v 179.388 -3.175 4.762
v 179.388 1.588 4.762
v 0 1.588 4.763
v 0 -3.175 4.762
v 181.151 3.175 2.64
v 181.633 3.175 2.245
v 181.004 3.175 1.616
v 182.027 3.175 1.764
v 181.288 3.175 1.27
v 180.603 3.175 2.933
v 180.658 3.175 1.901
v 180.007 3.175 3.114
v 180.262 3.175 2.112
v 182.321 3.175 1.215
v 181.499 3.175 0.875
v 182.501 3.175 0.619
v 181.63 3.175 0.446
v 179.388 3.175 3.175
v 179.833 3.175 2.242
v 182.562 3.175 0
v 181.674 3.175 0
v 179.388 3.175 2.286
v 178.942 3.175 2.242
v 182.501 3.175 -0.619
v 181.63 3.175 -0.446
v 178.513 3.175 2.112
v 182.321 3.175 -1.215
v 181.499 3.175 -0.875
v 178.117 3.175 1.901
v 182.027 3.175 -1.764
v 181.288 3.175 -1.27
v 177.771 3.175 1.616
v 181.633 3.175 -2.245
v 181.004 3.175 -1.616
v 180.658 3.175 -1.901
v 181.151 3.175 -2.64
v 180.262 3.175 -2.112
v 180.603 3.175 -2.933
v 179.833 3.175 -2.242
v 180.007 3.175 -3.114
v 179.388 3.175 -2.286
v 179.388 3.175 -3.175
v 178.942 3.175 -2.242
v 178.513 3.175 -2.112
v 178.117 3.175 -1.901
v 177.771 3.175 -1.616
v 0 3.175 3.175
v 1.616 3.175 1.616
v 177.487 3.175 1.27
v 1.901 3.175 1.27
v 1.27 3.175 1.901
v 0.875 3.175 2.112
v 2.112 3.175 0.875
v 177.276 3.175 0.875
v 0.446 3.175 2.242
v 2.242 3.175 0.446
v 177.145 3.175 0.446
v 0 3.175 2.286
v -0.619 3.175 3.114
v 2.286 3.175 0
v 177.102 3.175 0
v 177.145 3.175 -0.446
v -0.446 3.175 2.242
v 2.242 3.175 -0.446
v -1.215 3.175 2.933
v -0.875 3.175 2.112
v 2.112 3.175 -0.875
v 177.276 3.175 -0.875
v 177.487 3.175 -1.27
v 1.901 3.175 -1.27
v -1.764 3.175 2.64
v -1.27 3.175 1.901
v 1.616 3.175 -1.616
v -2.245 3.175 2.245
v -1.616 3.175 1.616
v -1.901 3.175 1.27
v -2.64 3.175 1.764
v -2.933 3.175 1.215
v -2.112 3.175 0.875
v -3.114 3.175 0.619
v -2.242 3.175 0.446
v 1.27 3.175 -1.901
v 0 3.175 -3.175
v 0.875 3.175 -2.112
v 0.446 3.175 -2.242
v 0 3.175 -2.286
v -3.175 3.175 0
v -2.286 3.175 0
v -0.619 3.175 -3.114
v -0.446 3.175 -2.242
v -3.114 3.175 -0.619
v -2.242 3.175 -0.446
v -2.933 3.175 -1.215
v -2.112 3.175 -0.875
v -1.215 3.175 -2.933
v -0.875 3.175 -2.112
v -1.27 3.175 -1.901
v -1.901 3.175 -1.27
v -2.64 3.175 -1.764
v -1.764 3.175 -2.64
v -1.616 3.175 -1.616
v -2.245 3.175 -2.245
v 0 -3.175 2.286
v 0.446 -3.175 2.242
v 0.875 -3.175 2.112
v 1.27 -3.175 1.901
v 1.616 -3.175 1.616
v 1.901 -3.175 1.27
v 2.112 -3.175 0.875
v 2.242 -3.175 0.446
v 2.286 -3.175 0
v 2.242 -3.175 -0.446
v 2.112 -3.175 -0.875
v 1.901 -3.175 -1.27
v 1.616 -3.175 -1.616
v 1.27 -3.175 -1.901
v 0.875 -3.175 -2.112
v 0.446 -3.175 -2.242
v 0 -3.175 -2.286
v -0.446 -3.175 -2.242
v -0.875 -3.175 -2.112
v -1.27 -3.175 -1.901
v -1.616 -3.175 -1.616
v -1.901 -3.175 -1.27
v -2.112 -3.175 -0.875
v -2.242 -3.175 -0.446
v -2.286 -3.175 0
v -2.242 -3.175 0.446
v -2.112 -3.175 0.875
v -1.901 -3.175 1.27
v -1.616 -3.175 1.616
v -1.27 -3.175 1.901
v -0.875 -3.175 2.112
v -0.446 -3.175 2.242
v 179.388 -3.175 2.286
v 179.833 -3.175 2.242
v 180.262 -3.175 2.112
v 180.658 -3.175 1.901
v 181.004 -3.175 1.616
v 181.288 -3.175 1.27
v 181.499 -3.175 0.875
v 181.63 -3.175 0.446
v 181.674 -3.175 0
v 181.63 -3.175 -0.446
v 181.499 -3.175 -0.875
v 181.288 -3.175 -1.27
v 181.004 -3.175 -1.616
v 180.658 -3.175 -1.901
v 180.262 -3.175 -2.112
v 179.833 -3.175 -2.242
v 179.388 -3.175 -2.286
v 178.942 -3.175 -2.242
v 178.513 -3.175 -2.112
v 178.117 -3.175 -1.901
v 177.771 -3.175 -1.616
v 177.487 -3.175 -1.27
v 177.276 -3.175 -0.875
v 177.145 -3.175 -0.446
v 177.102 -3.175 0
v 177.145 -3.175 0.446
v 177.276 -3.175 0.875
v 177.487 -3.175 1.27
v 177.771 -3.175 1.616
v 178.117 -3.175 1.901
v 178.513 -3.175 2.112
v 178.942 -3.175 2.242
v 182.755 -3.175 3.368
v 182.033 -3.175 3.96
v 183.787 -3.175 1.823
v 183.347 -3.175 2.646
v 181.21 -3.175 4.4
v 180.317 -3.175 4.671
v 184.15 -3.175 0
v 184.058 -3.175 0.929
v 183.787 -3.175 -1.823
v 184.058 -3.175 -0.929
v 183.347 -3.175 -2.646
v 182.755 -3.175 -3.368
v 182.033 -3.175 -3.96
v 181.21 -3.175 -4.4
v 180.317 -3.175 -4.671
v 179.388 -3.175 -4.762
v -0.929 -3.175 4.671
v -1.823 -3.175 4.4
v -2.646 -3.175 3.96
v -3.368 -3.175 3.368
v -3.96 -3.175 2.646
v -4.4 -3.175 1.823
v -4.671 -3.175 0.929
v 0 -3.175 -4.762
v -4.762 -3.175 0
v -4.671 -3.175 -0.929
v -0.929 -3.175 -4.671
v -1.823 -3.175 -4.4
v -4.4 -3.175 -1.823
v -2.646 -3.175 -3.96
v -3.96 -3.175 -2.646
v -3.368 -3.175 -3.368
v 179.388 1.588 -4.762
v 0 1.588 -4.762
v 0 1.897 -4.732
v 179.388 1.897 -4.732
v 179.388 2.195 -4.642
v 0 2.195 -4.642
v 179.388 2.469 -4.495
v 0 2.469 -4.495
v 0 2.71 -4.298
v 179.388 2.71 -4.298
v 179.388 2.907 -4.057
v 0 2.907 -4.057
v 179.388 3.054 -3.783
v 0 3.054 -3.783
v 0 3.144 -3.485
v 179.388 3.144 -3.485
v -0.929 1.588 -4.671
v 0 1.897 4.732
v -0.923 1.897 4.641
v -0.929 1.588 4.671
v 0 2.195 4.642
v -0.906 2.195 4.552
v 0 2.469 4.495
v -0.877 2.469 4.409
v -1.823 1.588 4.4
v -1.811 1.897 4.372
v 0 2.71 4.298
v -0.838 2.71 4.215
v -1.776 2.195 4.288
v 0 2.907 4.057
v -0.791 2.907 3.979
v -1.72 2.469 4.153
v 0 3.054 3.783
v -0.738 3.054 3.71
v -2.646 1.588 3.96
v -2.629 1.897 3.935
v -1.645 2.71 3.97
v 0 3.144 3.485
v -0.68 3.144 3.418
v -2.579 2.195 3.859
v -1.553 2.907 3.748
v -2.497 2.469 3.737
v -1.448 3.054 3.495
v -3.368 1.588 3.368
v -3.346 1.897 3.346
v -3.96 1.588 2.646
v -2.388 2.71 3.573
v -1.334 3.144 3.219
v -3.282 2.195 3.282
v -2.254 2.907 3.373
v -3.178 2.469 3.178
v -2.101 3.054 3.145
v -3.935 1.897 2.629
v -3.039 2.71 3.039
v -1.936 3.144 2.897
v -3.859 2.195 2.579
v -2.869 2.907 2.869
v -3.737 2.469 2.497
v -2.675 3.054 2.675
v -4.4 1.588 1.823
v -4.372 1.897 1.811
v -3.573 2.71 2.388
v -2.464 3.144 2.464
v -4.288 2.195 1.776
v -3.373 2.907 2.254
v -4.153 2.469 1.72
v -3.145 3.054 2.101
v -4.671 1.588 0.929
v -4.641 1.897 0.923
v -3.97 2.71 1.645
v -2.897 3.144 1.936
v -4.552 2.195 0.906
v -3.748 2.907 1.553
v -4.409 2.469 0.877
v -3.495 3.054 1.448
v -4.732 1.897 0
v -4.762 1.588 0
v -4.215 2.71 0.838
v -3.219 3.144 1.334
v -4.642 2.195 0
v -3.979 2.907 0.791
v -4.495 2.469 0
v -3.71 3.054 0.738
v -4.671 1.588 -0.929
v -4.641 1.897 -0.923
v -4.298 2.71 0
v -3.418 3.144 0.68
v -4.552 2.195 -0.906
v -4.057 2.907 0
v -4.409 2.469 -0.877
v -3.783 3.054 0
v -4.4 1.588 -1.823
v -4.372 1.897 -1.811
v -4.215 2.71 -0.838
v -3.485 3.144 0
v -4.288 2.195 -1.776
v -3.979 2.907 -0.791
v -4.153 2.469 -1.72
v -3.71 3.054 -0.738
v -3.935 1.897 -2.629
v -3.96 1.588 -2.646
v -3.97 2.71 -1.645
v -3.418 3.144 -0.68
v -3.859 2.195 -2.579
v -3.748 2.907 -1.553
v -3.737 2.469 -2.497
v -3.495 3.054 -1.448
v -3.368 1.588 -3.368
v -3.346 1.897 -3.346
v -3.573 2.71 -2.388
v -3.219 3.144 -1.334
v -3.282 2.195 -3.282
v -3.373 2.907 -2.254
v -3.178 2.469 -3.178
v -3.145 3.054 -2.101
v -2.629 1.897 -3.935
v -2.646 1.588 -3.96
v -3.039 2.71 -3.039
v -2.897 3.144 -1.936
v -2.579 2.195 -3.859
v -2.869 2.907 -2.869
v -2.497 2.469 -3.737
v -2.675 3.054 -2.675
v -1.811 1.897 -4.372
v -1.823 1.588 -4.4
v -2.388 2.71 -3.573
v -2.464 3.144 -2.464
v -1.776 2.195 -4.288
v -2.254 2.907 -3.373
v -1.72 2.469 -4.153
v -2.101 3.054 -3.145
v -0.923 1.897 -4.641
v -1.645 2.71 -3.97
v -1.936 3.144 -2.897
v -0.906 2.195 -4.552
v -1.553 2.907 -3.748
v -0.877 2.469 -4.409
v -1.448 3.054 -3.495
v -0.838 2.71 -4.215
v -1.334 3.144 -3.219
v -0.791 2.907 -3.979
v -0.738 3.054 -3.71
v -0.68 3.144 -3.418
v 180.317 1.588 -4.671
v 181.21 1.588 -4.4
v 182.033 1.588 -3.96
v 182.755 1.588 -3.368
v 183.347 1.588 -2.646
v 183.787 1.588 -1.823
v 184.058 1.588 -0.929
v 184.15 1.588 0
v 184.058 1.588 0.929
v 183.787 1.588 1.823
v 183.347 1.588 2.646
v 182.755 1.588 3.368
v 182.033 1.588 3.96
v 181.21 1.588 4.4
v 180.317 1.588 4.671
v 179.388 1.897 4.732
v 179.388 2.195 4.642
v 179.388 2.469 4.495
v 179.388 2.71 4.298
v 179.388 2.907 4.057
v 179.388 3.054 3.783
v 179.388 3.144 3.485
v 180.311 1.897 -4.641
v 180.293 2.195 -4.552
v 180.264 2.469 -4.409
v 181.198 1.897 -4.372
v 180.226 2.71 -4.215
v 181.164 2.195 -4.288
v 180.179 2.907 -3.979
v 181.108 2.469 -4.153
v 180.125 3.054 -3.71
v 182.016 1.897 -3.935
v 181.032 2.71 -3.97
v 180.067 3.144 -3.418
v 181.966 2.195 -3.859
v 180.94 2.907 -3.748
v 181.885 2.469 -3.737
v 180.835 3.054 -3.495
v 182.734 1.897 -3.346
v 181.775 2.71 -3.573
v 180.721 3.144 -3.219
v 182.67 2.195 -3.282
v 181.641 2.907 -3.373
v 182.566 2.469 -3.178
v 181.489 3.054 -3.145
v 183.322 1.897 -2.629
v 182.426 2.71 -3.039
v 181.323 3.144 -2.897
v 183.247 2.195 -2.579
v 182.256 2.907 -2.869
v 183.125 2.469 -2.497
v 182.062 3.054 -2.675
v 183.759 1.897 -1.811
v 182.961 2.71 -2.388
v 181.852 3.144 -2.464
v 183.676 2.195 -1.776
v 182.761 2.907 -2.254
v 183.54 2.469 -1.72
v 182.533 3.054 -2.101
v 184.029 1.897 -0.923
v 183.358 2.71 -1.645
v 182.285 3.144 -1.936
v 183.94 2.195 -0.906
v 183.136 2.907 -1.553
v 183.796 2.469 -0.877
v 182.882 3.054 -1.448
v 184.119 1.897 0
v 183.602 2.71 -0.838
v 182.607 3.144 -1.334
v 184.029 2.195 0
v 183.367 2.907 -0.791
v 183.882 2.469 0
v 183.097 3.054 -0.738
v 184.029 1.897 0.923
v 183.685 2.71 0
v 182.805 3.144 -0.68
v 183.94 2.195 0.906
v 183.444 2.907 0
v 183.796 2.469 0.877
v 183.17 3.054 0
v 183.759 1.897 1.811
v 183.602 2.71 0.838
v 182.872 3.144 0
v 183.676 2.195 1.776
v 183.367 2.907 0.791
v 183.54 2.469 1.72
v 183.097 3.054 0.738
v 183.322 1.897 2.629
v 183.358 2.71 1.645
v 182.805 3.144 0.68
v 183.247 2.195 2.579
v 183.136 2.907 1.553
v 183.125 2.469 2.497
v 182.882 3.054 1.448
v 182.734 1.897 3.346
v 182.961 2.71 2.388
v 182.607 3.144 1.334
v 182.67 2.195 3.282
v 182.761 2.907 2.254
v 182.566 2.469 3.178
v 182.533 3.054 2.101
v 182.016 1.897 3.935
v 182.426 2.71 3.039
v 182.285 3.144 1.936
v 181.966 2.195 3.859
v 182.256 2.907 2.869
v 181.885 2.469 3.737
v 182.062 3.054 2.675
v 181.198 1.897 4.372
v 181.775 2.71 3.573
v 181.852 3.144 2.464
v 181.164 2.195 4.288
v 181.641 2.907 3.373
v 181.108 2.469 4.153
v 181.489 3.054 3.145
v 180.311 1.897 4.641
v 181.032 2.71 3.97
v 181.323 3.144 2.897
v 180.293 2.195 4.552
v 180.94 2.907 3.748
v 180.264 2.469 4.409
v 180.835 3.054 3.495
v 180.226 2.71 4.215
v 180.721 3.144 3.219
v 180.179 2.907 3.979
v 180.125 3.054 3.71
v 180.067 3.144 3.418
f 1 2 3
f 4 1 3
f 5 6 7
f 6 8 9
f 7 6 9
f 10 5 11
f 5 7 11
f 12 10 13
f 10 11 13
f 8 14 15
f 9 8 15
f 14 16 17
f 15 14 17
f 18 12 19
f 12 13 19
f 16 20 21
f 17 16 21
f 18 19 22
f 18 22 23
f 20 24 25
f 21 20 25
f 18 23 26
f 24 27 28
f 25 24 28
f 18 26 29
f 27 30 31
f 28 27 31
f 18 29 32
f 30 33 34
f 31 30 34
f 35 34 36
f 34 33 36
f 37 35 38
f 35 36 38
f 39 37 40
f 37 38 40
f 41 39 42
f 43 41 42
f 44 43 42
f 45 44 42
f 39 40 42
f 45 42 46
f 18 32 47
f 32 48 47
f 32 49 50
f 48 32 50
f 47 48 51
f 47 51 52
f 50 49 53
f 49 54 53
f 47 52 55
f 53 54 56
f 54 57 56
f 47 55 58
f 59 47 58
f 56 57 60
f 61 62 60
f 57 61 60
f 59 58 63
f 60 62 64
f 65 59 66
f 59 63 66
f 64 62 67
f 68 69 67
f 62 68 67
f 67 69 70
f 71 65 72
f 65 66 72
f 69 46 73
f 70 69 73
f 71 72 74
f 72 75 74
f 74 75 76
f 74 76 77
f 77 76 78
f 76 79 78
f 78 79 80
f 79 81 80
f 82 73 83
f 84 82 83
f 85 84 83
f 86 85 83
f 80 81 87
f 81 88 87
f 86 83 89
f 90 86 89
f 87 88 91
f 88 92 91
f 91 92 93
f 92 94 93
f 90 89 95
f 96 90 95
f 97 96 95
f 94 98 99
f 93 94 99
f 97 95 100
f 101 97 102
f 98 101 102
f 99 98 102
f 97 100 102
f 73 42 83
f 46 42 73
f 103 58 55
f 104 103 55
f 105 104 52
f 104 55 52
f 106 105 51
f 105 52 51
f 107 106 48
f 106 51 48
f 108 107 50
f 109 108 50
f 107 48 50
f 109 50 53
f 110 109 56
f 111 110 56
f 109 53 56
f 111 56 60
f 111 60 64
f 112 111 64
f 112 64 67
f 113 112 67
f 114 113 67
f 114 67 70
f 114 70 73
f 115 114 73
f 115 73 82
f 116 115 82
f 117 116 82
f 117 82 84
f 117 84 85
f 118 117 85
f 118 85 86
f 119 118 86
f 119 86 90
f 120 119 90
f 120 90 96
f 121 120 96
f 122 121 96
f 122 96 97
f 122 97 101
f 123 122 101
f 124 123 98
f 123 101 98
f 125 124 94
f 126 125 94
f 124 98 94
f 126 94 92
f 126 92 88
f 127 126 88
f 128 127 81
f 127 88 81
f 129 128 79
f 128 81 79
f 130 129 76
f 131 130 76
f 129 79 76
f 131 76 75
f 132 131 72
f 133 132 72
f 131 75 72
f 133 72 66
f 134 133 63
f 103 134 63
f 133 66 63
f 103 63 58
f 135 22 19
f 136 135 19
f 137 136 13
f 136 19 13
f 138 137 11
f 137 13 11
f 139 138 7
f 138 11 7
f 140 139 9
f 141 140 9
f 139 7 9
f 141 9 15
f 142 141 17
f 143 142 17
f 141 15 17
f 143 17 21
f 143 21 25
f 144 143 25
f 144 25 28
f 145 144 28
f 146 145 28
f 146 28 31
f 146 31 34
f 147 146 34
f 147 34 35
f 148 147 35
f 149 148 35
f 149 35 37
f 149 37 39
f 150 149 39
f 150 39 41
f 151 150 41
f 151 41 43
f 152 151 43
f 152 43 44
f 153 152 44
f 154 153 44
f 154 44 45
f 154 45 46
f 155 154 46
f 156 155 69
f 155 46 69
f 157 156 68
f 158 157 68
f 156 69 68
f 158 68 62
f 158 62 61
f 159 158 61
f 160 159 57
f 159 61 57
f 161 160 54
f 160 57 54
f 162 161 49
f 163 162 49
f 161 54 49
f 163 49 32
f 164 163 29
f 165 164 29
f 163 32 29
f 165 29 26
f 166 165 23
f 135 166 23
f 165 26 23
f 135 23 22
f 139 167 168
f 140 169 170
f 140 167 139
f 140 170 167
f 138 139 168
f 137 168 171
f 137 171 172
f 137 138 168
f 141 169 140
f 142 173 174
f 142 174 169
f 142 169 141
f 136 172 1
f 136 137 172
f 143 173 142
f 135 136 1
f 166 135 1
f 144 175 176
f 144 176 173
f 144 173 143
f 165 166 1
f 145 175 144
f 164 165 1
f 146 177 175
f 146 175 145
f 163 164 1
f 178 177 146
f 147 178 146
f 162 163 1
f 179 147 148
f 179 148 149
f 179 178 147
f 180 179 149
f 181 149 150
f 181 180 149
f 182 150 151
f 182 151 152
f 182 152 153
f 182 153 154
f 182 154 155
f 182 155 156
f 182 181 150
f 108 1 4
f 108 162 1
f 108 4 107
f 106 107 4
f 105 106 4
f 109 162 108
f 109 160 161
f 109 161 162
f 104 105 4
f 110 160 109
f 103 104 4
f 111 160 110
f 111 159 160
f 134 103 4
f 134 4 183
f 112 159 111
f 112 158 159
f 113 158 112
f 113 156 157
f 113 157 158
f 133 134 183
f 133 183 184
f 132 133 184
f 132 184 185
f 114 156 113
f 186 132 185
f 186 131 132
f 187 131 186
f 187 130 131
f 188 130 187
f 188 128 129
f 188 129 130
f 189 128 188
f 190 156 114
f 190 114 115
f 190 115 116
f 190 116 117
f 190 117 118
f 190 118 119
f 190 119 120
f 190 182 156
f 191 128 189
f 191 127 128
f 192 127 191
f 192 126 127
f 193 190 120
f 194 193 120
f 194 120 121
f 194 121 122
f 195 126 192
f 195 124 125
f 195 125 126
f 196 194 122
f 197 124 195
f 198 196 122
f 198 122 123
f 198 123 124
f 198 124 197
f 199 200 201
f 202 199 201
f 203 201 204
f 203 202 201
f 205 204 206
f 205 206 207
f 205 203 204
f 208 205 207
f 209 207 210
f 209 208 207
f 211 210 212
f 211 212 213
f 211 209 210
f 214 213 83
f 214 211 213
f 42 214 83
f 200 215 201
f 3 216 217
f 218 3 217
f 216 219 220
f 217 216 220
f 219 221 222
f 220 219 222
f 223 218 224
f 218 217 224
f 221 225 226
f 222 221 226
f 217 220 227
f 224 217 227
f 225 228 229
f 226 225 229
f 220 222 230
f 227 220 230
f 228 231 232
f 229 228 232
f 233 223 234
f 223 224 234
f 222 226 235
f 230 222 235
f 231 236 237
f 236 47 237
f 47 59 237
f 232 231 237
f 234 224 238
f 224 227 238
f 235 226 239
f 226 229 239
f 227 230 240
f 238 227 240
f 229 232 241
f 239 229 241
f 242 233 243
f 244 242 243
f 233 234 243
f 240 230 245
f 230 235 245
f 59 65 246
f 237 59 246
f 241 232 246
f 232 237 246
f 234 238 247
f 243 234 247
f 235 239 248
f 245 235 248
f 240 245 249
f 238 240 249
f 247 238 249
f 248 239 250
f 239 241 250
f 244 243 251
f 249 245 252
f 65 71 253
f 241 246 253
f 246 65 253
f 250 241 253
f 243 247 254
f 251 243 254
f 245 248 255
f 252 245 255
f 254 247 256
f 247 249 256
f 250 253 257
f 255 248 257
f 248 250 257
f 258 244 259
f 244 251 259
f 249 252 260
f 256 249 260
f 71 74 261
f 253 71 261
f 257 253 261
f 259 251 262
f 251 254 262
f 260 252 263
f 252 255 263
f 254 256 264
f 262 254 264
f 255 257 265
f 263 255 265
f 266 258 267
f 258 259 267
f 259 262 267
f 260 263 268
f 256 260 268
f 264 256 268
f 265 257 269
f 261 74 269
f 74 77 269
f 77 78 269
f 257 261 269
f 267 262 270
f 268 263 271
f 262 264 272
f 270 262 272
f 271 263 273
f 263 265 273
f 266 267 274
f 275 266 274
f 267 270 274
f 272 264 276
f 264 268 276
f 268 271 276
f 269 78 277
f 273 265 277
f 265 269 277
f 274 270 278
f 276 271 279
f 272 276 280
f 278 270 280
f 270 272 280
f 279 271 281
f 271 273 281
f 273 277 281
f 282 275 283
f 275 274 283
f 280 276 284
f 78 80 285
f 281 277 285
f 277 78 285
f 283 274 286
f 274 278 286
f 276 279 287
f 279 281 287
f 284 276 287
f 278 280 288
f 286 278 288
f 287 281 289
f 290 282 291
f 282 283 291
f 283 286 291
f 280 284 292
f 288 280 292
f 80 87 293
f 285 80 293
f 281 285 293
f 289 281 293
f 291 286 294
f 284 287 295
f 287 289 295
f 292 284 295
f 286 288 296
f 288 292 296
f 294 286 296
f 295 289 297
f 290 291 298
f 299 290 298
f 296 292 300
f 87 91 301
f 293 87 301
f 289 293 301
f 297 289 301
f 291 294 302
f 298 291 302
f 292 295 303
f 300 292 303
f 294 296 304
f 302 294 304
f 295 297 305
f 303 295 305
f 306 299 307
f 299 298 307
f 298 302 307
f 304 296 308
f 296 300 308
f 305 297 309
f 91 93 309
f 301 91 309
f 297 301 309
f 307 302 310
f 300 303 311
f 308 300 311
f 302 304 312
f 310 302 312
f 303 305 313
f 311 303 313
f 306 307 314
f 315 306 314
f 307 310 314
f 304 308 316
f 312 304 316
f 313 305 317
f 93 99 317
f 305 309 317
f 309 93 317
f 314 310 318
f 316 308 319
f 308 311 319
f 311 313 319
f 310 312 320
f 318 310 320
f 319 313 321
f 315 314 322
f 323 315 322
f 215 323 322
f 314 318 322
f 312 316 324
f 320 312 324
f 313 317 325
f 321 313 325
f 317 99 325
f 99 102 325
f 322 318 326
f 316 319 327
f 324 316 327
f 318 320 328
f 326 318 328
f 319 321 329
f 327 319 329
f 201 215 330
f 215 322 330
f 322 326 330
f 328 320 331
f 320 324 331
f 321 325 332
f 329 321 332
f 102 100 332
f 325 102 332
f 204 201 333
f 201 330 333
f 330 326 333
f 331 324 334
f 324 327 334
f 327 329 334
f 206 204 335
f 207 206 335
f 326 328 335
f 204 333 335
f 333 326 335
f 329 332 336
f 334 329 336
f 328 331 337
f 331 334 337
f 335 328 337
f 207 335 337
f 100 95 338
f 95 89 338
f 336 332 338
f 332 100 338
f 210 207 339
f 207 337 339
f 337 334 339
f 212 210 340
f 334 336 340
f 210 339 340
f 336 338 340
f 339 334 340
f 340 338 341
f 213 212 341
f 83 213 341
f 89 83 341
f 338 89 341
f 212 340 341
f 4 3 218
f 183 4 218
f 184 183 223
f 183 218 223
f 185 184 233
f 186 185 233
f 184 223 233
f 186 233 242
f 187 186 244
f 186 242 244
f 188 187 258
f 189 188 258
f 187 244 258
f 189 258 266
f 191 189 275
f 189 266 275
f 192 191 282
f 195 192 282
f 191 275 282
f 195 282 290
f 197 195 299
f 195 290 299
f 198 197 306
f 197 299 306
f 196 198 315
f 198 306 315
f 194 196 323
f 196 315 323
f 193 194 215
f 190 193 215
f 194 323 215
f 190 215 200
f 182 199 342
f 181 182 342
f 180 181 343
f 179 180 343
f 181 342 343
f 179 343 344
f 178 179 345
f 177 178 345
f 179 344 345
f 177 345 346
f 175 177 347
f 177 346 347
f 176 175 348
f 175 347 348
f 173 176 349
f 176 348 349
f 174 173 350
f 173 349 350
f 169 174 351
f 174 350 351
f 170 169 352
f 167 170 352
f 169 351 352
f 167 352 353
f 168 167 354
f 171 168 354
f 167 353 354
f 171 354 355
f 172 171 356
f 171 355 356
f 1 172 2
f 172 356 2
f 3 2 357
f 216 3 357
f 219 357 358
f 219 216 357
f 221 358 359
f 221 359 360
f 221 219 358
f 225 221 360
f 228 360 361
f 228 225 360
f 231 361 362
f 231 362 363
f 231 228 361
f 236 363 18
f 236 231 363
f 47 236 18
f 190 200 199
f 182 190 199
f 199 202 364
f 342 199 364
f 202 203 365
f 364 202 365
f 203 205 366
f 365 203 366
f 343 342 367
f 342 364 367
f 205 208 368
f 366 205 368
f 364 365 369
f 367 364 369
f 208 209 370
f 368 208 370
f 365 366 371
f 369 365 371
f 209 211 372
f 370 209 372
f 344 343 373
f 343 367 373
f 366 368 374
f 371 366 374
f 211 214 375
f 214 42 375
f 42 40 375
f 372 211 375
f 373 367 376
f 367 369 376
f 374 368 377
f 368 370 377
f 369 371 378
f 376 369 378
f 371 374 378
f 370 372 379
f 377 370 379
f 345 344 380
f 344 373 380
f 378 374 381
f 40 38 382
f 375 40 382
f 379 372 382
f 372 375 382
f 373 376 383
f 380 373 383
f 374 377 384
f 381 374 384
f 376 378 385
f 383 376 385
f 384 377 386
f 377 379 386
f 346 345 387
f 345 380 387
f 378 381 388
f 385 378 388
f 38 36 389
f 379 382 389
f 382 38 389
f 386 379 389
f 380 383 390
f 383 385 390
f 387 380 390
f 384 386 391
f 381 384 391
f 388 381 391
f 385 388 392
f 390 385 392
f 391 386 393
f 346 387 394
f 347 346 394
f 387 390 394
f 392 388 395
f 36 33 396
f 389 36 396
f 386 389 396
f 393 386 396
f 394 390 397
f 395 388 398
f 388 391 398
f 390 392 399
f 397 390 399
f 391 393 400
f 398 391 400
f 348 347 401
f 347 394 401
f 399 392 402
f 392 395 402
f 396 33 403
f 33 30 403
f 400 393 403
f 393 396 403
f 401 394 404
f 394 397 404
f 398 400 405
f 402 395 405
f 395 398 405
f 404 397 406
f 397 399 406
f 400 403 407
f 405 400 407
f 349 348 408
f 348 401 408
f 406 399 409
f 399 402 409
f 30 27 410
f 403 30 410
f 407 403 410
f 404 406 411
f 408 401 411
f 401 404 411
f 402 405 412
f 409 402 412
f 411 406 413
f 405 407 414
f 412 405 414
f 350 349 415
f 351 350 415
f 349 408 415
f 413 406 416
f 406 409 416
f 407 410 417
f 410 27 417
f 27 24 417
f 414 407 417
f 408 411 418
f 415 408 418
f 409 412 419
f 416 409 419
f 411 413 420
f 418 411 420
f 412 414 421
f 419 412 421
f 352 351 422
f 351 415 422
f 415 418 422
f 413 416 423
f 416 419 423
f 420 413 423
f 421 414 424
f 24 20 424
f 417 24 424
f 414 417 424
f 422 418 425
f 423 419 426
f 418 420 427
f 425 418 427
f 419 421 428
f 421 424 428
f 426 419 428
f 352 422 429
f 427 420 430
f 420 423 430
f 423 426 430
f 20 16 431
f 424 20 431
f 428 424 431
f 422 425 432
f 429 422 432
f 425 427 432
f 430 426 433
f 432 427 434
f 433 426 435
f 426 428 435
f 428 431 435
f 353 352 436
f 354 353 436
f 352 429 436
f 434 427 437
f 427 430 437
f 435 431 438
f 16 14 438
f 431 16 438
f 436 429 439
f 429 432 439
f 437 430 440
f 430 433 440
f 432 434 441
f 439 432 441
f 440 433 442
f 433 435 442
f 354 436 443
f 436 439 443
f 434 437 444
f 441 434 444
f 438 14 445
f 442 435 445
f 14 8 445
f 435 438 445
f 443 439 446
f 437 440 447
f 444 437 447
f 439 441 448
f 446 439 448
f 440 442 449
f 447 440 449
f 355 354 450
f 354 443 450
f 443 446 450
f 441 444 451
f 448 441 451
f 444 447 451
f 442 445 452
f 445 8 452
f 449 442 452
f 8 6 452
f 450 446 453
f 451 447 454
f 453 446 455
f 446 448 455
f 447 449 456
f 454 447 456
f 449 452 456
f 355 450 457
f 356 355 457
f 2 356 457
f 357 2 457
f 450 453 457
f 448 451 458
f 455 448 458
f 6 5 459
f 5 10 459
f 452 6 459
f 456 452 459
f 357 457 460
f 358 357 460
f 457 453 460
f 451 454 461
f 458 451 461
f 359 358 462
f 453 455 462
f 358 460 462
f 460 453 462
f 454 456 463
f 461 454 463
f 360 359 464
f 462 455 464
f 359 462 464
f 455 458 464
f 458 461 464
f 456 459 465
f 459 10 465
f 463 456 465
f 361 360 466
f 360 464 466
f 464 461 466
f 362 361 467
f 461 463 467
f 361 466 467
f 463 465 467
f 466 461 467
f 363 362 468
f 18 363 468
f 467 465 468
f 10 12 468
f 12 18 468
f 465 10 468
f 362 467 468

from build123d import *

# Parameters (mm, degrees)
BOSS_EXTRUDE1_DEPTH = 3.175
SKETCH2_R           = 2.286
CUT_EXTRUDE1_DEPTH  = 185.320987428
FILLET1_R           = 1.5875


with BuildPart() as part:
    # Sketch1 → Boss-Extrude1 (new, symmetric)
    with BuildSketch(Plane(origin=(0, 0, 0), x_dir=(1, 0, 0), z_dir=(0, 1, 0))):
        with BuildLine():
            Line((0, 4.7625), (179.3875, 4.7625))
            ThreePointArc((179.3875, 4.7625), (184.15, 0), (179.3875, -4.7625))
            Line((179.3875, -4.7625), (0, -4.7625))
            ThreePointArc((0, -4.7625), (-4.7625, 0), (0, 4.7625))
        make_face()
    extrude(amount=BOSS_EXTRUDE1_DEPTH, both=True)

    # Sketch2 → Cut-Extrude1 (cut, through all)
    with BuildSketch(Plane(origin=(0, 3.175, 0), x_dir=(1, 0, 0), z_dir=(0, 1, 0))):
        with Locations(Location((0, 0, 0), (0, 0, 270))):
            Circle(SKETCH2_R)
        with Locations(Location((179.3875, 0, 0), (0, 0, 270))):
            Circle(SKETCH2_R)
    extrude(amount=-CUT_EXTRUDE1_DEPTH, mode=Mode.SUBTRACT)

    # Fillet1
    fillet1_edges = [part.edges().sort_by_distance(p)[0] for p in [
        (184.15, 3.175, 0),
        (89.69375, 3.175, -4.7625),
        (-4.7625, 3.175, 0),
        (89.69375, 3.175, 4.7625),
    ]]
    fillet(fillet1_edges, radius=FILLET1_R)


solid = part.part
